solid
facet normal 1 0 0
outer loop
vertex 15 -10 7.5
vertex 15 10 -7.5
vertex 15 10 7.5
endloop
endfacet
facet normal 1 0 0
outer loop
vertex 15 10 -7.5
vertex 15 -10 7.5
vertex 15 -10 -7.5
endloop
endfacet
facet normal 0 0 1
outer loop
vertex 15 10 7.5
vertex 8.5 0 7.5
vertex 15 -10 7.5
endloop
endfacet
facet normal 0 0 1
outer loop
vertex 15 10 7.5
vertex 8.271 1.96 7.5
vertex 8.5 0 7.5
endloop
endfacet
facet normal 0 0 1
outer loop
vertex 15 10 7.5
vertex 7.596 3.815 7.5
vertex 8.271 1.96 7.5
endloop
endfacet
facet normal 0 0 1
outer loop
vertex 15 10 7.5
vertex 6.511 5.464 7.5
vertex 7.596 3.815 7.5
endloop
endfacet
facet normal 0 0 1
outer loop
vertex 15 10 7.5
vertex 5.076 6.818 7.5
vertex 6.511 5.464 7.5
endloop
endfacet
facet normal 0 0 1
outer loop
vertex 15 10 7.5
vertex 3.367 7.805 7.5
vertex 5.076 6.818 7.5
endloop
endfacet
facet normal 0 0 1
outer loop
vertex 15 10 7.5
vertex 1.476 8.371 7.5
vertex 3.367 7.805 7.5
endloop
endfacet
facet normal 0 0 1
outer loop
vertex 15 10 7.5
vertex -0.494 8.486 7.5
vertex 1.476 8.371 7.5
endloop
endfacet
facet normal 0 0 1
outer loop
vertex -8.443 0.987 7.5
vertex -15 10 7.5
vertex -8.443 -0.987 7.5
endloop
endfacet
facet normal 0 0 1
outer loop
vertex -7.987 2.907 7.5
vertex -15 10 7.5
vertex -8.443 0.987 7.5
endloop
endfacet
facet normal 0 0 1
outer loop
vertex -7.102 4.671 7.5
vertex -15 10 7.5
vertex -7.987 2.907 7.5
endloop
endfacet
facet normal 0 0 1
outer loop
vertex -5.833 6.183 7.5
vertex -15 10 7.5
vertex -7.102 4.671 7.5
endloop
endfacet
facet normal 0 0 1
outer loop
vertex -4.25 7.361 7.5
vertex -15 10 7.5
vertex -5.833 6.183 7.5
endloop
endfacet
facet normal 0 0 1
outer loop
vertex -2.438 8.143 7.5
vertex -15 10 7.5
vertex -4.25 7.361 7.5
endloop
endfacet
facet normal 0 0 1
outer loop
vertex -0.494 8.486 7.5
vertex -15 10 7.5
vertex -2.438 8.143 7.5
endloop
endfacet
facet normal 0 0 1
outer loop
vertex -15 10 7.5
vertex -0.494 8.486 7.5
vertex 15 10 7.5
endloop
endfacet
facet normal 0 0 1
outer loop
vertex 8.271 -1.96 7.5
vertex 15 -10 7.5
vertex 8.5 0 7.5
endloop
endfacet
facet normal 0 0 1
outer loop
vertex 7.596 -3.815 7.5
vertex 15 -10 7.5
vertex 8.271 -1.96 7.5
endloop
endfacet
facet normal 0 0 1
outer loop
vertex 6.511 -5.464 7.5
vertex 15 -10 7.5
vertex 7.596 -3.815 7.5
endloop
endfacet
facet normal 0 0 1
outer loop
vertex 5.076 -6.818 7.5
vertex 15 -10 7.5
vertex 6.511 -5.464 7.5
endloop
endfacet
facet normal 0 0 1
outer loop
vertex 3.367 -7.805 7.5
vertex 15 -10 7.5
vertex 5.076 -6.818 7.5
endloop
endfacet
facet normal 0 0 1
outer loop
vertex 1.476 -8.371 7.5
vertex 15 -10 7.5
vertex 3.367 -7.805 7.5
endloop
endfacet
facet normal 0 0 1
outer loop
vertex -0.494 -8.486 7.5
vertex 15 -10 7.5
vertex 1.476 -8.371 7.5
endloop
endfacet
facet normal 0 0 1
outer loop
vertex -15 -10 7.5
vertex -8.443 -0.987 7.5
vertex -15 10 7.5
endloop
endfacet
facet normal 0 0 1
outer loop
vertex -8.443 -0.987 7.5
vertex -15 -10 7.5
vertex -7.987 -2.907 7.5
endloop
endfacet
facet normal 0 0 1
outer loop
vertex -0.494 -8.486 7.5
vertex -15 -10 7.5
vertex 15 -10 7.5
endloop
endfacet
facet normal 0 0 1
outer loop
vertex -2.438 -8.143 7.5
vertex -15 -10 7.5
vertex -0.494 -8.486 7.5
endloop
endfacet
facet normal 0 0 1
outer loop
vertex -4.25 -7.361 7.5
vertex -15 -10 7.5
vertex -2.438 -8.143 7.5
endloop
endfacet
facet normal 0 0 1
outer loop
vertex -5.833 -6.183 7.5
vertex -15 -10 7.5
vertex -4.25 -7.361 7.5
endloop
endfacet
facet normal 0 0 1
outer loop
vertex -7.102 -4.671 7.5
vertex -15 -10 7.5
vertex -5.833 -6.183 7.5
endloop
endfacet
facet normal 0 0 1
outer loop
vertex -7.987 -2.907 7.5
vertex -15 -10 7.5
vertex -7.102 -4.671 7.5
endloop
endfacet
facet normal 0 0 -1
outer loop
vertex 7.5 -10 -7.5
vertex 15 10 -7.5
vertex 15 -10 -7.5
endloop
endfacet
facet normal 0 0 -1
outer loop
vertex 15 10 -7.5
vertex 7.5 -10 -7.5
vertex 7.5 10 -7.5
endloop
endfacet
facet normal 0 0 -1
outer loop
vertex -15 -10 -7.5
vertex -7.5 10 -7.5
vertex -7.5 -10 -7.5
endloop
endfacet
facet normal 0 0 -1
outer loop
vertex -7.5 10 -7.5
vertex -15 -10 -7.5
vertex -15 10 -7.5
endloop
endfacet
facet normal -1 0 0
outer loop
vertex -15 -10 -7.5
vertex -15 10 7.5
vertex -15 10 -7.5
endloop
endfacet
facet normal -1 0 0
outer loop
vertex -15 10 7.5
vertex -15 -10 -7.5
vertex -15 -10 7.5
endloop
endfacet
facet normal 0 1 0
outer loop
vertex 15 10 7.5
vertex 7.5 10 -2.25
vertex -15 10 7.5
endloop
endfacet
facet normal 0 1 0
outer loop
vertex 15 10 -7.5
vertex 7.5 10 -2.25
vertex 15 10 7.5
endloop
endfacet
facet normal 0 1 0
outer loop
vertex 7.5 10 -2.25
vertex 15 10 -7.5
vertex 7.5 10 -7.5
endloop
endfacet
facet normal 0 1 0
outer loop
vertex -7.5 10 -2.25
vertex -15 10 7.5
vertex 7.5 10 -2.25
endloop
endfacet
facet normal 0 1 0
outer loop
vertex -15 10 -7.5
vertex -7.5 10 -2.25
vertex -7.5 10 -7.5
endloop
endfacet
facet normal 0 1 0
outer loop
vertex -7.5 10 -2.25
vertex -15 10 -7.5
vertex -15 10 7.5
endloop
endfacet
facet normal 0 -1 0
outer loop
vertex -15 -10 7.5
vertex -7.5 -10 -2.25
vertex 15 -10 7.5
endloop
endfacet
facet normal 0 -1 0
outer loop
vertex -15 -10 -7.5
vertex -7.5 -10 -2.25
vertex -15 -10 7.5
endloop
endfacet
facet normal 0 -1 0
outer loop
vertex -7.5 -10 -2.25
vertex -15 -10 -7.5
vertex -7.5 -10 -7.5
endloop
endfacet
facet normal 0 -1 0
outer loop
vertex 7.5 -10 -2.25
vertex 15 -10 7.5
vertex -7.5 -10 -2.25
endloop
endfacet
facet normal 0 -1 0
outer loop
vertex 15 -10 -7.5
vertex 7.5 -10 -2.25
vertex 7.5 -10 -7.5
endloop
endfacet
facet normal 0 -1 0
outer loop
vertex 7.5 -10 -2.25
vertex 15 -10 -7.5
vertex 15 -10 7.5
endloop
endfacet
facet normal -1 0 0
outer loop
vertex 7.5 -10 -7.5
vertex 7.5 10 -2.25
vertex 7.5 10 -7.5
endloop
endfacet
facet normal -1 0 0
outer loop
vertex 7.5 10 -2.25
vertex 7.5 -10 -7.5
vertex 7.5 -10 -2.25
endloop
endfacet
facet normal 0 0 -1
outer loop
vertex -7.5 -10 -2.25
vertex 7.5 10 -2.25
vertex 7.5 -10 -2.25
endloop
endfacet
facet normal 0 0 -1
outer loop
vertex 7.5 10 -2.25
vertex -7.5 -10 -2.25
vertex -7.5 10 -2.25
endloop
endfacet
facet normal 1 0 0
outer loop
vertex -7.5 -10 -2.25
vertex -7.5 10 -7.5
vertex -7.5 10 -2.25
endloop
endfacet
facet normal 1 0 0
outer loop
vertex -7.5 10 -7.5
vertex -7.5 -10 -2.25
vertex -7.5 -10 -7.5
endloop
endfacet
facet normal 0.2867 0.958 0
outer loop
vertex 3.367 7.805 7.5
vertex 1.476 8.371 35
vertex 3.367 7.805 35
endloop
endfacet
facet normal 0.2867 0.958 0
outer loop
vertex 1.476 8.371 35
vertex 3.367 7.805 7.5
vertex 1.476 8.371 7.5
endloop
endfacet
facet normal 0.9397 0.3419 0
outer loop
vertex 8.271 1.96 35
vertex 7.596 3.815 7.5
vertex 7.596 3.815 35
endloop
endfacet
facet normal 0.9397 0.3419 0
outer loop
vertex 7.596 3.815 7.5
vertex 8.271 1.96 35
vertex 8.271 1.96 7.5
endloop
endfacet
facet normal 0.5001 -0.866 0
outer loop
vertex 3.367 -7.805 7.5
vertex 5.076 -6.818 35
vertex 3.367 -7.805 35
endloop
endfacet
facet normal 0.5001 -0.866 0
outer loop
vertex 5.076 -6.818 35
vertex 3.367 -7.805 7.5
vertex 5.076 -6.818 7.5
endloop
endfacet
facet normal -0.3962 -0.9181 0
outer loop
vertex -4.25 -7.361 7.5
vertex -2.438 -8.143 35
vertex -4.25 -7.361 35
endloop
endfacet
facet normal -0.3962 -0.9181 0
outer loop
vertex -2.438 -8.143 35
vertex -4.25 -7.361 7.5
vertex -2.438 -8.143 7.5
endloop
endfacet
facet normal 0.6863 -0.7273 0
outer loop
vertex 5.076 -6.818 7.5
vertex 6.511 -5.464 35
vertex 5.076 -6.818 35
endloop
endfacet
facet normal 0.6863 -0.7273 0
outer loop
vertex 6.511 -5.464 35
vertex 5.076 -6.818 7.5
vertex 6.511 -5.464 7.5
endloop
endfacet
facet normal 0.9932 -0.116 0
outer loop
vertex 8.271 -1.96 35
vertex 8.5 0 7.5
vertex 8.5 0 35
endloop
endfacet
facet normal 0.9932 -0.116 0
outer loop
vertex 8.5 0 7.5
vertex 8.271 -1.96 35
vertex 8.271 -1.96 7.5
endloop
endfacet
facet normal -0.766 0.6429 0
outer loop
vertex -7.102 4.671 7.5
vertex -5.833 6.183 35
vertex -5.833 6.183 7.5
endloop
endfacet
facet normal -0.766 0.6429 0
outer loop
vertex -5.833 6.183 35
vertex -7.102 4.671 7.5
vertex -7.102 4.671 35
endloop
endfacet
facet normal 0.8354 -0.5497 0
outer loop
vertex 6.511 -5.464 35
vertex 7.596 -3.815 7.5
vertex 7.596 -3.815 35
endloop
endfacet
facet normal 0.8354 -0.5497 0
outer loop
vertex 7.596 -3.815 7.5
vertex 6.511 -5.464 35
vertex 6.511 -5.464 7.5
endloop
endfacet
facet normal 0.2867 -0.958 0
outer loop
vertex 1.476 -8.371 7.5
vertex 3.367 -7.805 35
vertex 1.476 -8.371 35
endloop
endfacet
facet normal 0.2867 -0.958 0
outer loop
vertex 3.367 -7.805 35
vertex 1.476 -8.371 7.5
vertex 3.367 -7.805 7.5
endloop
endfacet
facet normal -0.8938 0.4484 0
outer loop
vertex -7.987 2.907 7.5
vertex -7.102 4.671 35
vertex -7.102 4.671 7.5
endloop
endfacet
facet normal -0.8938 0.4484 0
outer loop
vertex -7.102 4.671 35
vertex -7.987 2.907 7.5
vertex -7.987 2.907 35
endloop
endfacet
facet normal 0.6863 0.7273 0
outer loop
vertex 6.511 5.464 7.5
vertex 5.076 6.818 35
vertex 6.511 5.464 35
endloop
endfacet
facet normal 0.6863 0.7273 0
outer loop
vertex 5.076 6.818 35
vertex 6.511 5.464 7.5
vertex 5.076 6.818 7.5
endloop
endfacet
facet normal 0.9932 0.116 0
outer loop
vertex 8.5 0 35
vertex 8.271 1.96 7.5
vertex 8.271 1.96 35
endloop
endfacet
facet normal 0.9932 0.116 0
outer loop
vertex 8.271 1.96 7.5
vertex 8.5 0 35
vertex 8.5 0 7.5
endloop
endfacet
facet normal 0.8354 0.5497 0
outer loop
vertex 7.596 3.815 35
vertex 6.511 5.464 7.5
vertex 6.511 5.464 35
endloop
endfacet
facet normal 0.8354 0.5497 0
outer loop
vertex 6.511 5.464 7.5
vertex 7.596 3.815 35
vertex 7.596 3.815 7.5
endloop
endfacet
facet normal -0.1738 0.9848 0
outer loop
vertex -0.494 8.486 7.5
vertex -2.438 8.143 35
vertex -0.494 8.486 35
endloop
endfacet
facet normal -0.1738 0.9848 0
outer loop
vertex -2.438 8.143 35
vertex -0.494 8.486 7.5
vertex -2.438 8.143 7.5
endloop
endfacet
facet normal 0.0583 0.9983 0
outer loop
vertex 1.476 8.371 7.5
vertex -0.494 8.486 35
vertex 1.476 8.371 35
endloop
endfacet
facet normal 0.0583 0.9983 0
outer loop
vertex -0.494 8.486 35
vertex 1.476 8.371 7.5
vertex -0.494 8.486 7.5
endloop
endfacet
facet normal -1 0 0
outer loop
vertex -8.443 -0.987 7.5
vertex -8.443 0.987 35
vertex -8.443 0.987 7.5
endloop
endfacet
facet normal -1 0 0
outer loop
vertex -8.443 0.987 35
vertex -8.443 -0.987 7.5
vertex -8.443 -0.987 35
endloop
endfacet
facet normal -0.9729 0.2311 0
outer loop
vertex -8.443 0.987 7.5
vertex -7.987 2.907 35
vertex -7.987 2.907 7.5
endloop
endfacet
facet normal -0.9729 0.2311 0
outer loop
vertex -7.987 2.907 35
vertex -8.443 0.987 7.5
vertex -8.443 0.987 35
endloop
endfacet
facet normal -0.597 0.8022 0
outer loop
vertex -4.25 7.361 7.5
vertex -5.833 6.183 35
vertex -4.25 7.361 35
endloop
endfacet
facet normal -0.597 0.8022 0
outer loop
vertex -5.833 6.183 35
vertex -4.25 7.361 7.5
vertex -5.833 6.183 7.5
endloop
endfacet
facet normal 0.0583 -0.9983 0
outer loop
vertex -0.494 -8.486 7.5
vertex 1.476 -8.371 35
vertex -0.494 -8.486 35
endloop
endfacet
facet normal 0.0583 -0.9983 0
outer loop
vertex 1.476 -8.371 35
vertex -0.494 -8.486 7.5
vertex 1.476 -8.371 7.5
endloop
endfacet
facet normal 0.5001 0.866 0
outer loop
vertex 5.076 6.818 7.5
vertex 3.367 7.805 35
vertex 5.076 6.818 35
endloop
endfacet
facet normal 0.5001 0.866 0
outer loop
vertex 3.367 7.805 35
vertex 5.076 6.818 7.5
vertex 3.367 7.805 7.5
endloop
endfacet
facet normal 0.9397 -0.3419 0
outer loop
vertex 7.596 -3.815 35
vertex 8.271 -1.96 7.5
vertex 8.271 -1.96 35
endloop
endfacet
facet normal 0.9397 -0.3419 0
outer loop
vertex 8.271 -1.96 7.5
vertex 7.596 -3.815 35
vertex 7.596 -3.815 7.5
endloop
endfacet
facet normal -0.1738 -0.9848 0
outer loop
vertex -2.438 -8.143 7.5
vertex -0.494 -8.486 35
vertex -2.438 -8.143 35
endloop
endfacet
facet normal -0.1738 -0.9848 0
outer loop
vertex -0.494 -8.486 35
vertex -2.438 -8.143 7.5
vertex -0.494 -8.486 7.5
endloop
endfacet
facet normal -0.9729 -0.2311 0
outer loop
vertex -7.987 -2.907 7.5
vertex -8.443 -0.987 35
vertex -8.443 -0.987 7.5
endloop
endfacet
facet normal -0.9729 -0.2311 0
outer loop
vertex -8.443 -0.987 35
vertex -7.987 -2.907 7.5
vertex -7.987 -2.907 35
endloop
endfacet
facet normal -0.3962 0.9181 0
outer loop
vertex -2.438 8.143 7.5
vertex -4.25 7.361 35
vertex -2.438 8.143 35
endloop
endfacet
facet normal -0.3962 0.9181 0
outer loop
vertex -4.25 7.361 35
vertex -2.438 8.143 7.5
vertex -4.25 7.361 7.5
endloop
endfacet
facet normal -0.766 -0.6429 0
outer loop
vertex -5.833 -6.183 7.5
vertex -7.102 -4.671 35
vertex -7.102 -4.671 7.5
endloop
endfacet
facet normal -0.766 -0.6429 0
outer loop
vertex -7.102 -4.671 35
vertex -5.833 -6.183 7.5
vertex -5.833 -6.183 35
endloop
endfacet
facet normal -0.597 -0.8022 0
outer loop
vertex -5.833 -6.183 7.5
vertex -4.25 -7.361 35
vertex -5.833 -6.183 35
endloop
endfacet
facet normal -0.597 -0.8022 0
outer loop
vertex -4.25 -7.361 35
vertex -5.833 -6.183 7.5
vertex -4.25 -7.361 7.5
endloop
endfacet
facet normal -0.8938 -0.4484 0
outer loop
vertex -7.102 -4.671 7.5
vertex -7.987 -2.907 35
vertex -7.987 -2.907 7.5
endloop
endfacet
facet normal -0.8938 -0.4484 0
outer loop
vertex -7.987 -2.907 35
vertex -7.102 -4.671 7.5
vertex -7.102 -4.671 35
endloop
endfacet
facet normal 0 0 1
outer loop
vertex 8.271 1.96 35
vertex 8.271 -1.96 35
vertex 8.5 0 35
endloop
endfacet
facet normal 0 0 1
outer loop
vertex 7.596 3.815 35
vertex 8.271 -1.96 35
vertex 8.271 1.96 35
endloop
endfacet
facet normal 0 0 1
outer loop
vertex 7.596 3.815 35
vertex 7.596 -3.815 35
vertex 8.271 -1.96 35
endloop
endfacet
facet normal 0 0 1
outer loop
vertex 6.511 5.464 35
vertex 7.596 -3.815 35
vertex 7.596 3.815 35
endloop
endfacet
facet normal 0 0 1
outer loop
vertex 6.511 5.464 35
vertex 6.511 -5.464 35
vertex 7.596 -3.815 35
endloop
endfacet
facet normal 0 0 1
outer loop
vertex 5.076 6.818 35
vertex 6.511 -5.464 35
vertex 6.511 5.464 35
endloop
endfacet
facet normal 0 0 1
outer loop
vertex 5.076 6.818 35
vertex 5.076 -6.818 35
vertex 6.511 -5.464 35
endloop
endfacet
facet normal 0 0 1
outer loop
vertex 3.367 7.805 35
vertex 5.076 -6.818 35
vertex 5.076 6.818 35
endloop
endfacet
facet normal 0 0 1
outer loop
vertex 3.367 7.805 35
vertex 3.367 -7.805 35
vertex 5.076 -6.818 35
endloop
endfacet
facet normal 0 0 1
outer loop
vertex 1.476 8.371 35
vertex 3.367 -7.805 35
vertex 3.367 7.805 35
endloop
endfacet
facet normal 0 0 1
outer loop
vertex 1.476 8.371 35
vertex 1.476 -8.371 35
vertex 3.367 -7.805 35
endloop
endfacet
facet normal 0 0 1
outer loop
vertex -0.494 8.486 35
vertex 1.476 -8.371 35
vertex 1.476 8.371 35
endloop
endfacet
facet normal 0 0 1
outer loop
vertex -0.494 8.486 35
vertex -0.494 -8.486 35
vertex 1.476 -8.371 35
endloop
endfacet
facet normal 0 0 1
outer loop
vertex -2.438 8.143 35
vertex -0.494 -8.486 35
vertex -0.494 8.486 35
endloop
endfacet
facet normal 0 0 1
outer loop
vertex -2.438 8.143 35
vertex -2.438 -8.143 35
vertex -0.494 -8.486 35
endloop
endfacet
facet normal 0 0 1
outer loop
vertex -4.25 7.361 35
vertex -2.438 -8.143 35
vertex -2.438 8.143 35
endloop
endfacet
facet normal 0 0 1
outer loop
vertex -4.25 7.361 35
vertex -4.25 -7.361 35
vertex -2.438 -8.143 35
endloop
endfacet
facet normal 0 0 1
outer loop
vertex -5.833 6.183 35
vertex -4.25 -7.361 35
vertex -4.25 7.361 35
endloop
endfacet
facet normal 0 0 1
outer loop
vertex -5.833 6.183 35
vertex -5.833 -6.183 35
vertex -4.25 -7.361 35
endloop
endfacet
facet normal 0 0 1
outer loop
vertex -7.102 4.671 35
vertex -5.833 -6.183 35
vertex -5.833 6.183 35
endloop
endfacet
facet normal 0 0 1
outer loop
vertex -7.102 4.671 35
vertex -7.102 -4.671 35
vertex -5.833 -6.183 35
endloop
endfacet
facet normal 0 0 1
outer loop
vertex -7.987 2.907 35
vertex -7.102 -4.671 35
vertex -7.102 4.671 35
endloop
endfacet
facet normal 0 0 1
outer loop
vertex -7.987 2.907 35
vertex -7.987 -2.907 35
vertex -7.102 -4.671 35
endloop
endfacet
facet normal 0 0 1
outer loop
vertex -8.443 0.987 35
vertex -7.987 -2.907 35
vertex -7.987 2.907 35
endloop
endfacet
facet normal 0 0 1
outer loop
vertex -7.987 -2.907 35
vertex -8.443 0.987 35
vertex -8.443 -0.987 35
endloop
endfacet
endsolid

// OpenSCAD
/*
 * Written by Dermot Tynan, Kalopa Research.
 * GPLv2.
 *
 * This is the definition for the five mast supports on the upper
 * leading-edge of the mast, A8 -> A12.
 *
 * All dimensions are in mm.
 */
module mast_step() {
	union() {
		difference() {
			cube([30, 20, 15], center = true);
			translate([0, 0, -5]) cube([15, 100, 5.5], center = true);
			translate([0, 0, -10]) cube([30, 100, 5], center = true);
		}
		translate([0, 0, 20]) cylinder(r = 8.5, h = 30, center = true);
	}
}

mast_step();
